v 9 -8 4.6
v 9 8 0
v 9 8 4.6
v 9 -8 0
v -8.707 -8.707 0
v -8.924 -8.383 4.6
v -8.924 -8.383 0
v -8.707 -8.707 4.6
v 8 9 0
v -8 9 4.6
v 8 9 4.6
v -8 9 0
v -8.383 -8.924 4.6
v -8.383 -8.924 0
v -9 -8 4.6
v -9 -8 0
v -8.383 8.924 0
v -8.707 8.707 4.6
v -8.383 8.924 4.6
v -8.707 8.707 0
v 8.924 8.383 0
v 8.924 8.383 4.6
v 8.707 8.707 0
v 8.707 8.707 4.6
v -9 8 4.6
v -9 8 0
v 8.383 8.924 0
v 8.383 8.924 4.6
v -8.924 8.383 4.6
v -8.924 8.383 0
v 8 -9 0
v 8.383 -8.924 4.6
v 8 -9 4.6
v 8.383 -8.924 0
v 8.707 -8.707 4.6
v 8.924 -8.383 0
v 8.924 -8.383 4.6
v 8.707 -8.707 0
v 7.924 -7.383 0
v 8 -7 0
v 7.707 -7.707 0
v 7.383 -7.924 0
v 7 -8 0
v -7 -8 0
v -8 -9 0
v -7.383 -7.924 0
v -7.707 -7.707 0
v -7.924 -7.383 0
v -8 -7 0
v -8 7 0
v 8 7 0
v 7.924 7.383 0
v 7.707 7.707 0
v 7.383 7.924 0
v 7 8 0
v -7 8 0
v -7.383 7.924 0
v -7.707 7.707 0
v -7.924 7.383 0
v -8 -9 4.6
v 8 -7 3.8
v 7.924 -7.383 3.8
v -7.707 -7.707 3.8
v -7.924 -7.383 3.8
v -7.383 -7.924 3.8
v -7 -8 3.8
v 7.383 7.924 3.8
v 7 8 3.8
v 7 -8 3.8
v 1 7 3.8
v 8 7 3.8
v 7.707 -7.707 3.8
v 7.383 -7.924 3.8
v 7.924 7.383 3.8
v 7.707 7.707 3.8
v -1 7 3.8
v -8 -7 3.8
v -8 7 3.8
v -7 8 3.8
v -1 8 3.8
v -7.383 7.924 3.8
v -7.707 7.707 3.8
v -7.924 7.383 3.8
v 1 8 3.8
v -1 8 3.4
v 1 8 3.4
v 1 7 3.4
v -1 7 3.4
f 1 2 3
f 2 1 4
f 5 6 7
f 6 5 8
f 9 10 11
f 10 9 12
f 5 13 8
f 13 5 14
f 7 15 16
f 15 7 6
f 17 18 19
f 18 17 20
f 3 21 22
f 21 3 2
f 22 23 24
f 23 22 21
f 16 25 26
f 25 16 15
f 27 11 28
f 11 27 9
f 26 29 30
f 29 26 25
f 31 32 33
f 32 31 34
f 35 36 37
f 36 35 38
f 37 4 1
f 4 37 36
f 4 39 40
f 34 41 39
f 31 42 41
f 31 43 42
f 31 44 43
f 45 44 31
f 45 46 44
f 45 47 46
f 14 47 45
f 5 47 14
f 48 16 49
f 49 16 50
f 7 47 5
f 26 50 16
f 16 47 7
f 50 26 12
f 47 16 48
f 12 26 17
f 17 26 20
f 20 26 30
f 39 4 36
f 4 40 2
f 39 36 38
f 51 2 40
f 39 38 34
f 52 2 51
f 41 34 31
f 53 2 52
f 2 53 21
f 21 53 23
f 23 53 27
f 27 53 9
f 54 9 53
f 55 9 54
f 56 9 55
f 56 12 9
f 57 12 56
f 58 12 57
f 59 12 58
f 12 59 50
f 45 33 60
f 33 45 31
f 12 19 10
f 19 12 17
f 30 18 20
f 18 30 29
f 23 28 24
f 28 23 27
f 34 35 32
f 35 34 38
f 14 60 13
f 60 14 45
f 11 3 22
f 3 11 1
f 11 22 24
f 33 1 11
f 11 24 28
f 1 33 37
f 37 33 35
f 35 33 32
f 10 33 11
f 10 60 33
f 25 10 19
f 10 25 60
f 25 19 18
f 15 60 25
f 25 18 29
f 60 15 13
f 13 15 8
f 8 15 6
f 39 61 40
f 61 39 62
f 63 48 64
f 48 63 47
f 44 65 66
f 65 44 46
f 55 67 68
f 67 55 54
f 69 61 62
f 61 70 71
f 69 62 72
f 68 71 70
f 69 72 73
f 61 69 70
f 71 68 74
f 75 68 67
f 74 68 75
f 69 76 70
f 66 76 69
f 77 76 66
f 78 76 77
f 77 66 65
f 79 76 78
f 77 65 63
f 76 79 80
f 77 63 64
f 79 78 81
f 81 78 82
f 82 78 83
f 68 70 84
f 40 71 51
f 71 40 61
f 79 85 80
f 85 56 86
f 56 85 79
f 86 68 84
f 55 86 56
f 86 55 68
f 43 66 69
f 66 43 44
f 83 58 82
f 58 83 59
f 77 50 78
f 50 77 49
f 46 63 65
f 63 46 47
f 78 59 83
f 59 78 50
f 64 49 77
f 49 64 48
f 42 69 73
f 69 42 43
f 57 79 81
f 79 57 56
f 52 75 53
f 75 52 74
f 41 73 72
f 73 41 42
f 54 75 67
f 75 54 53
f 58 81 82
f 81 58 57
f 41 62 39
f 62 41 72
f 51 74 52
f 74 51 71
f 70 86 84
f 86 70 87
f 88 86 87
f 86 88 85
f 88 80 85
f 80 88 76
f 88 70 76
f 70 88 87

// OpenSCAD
// file: ../stems/cherry.scad
// origin about center of top of stem

module CherryStem (
	height,
	radius,
	armXWidth, // arm parallel to x axis
	armYWidth, // arm parallel to y axis
	armLength,
	openingTolerance = 0,
	openingHeight = .4
) {
	translate([0, 0, -height / 2])
		difference() {
			cylinder(r = radius, h = height, center = true);
			cube([armLength, armXWidth, height + 1], true);
			cube([armYWidth, armLength, height + 1], true);
			translate([0, 0, -height / 2]) {
				cube([armLength + openingTolerance, armXWidth + openingTolerance, openingHeight * 2], true);
				cube([armYWidth + openingTolerance, armLength + openingTolerance, openingHeight * 2], true);
			}
		}
};
// file: ../caps/minimal.scad
// centered about center of bottom of key

module MinimalCap (
	bevelRadius,
	height,
	sideWallWidth,
	topWallHeight,
	depth,
	width,
	withOrienter = true,
	footprintOnly = false
) {
	cornerX = width / 2 - bevelRadius;
	cornerY = depth / 2 - bevelRadius;
	innerBevel = bevelRadius; // TODO: make this proportional
	innerCornerX = width / 2 - sideWallWidth - innerBevel;
	innerCornerY = depth / 2 - sideWallWidth - innerBevel;

	orienterHeight = .4;
	orienterWidth = 2;
	orienterDepth = 1;

	translate([0, 0, height / 2]) {
		difference() {
			// TODO: refactor using utils repo
			hull() {
				translate([cornerX, cornerY, 0])
					cylinder(r = bevelRadius, h = height, center = true);
				translate([-cornerX, cornerY, 0])
					cylinder(r = bevelRadius, h = height, center = true);
				translate([-cornerX, -cornerY, 0])
					cylinder(r = bevelRadius, h = height, center = true);
				translate([cornerX, -cornerY, 0])
					cylinder(r = bevelRadius, h = height, center = true);
			}
			if (!footprintOnly) {
				hull() {
					translate([innerCornerX, innerCornerY, -topWallHeight])
						cylinder(r = bevelRadius, h = height, center = true);
					translate([-innerCornerX, innerCornerY, -topWallHeight])
						cylinder(r = bevelRadius, h = height, center = true);
					translate([-innerCornerX, -innerCornerY, -topWallHeight])
						cylinder(r = bevelRadius, h = height, center = true);
					translate([innerCornerX, -innerCornerY, -topWallHeight])
						cylinder(r = bevelRadius, h = height, center = true);
				}
			}
		}
		if (withOrienter) {
			translate([0, depth / 2 - sideWallWidth - orienterDepth / 2, height / 2 - topWallHeight - orienterHeight / 2])
				cube([orienterWidth, orienterDepth, orienterHeight], true);
		}
	}
};
// main file
use <../caps/minimal.scad>
use <../stems/cherry.scad>

$fn = $preview ? 8 : 16;

height = 4.6;
topWallHeight = .8;

MinimalCap (
	bevelRadius = 1,
	height = height,
	sideWallWidth = 1,
	topWallHeight = topWallHeight,
	depth = 18,
	width = 18
	// withHole = false
);


// translate([0, 0, height - topWallHeight]) CherryStem(
// 	height = height - topWallHeight,
// 	radius = 3, 
// 	armLength = 4, 
// 	armXWidth = 1.2, 
// 	armYWidth = 1.1, 
// 	openingTolerance = .2
// );
